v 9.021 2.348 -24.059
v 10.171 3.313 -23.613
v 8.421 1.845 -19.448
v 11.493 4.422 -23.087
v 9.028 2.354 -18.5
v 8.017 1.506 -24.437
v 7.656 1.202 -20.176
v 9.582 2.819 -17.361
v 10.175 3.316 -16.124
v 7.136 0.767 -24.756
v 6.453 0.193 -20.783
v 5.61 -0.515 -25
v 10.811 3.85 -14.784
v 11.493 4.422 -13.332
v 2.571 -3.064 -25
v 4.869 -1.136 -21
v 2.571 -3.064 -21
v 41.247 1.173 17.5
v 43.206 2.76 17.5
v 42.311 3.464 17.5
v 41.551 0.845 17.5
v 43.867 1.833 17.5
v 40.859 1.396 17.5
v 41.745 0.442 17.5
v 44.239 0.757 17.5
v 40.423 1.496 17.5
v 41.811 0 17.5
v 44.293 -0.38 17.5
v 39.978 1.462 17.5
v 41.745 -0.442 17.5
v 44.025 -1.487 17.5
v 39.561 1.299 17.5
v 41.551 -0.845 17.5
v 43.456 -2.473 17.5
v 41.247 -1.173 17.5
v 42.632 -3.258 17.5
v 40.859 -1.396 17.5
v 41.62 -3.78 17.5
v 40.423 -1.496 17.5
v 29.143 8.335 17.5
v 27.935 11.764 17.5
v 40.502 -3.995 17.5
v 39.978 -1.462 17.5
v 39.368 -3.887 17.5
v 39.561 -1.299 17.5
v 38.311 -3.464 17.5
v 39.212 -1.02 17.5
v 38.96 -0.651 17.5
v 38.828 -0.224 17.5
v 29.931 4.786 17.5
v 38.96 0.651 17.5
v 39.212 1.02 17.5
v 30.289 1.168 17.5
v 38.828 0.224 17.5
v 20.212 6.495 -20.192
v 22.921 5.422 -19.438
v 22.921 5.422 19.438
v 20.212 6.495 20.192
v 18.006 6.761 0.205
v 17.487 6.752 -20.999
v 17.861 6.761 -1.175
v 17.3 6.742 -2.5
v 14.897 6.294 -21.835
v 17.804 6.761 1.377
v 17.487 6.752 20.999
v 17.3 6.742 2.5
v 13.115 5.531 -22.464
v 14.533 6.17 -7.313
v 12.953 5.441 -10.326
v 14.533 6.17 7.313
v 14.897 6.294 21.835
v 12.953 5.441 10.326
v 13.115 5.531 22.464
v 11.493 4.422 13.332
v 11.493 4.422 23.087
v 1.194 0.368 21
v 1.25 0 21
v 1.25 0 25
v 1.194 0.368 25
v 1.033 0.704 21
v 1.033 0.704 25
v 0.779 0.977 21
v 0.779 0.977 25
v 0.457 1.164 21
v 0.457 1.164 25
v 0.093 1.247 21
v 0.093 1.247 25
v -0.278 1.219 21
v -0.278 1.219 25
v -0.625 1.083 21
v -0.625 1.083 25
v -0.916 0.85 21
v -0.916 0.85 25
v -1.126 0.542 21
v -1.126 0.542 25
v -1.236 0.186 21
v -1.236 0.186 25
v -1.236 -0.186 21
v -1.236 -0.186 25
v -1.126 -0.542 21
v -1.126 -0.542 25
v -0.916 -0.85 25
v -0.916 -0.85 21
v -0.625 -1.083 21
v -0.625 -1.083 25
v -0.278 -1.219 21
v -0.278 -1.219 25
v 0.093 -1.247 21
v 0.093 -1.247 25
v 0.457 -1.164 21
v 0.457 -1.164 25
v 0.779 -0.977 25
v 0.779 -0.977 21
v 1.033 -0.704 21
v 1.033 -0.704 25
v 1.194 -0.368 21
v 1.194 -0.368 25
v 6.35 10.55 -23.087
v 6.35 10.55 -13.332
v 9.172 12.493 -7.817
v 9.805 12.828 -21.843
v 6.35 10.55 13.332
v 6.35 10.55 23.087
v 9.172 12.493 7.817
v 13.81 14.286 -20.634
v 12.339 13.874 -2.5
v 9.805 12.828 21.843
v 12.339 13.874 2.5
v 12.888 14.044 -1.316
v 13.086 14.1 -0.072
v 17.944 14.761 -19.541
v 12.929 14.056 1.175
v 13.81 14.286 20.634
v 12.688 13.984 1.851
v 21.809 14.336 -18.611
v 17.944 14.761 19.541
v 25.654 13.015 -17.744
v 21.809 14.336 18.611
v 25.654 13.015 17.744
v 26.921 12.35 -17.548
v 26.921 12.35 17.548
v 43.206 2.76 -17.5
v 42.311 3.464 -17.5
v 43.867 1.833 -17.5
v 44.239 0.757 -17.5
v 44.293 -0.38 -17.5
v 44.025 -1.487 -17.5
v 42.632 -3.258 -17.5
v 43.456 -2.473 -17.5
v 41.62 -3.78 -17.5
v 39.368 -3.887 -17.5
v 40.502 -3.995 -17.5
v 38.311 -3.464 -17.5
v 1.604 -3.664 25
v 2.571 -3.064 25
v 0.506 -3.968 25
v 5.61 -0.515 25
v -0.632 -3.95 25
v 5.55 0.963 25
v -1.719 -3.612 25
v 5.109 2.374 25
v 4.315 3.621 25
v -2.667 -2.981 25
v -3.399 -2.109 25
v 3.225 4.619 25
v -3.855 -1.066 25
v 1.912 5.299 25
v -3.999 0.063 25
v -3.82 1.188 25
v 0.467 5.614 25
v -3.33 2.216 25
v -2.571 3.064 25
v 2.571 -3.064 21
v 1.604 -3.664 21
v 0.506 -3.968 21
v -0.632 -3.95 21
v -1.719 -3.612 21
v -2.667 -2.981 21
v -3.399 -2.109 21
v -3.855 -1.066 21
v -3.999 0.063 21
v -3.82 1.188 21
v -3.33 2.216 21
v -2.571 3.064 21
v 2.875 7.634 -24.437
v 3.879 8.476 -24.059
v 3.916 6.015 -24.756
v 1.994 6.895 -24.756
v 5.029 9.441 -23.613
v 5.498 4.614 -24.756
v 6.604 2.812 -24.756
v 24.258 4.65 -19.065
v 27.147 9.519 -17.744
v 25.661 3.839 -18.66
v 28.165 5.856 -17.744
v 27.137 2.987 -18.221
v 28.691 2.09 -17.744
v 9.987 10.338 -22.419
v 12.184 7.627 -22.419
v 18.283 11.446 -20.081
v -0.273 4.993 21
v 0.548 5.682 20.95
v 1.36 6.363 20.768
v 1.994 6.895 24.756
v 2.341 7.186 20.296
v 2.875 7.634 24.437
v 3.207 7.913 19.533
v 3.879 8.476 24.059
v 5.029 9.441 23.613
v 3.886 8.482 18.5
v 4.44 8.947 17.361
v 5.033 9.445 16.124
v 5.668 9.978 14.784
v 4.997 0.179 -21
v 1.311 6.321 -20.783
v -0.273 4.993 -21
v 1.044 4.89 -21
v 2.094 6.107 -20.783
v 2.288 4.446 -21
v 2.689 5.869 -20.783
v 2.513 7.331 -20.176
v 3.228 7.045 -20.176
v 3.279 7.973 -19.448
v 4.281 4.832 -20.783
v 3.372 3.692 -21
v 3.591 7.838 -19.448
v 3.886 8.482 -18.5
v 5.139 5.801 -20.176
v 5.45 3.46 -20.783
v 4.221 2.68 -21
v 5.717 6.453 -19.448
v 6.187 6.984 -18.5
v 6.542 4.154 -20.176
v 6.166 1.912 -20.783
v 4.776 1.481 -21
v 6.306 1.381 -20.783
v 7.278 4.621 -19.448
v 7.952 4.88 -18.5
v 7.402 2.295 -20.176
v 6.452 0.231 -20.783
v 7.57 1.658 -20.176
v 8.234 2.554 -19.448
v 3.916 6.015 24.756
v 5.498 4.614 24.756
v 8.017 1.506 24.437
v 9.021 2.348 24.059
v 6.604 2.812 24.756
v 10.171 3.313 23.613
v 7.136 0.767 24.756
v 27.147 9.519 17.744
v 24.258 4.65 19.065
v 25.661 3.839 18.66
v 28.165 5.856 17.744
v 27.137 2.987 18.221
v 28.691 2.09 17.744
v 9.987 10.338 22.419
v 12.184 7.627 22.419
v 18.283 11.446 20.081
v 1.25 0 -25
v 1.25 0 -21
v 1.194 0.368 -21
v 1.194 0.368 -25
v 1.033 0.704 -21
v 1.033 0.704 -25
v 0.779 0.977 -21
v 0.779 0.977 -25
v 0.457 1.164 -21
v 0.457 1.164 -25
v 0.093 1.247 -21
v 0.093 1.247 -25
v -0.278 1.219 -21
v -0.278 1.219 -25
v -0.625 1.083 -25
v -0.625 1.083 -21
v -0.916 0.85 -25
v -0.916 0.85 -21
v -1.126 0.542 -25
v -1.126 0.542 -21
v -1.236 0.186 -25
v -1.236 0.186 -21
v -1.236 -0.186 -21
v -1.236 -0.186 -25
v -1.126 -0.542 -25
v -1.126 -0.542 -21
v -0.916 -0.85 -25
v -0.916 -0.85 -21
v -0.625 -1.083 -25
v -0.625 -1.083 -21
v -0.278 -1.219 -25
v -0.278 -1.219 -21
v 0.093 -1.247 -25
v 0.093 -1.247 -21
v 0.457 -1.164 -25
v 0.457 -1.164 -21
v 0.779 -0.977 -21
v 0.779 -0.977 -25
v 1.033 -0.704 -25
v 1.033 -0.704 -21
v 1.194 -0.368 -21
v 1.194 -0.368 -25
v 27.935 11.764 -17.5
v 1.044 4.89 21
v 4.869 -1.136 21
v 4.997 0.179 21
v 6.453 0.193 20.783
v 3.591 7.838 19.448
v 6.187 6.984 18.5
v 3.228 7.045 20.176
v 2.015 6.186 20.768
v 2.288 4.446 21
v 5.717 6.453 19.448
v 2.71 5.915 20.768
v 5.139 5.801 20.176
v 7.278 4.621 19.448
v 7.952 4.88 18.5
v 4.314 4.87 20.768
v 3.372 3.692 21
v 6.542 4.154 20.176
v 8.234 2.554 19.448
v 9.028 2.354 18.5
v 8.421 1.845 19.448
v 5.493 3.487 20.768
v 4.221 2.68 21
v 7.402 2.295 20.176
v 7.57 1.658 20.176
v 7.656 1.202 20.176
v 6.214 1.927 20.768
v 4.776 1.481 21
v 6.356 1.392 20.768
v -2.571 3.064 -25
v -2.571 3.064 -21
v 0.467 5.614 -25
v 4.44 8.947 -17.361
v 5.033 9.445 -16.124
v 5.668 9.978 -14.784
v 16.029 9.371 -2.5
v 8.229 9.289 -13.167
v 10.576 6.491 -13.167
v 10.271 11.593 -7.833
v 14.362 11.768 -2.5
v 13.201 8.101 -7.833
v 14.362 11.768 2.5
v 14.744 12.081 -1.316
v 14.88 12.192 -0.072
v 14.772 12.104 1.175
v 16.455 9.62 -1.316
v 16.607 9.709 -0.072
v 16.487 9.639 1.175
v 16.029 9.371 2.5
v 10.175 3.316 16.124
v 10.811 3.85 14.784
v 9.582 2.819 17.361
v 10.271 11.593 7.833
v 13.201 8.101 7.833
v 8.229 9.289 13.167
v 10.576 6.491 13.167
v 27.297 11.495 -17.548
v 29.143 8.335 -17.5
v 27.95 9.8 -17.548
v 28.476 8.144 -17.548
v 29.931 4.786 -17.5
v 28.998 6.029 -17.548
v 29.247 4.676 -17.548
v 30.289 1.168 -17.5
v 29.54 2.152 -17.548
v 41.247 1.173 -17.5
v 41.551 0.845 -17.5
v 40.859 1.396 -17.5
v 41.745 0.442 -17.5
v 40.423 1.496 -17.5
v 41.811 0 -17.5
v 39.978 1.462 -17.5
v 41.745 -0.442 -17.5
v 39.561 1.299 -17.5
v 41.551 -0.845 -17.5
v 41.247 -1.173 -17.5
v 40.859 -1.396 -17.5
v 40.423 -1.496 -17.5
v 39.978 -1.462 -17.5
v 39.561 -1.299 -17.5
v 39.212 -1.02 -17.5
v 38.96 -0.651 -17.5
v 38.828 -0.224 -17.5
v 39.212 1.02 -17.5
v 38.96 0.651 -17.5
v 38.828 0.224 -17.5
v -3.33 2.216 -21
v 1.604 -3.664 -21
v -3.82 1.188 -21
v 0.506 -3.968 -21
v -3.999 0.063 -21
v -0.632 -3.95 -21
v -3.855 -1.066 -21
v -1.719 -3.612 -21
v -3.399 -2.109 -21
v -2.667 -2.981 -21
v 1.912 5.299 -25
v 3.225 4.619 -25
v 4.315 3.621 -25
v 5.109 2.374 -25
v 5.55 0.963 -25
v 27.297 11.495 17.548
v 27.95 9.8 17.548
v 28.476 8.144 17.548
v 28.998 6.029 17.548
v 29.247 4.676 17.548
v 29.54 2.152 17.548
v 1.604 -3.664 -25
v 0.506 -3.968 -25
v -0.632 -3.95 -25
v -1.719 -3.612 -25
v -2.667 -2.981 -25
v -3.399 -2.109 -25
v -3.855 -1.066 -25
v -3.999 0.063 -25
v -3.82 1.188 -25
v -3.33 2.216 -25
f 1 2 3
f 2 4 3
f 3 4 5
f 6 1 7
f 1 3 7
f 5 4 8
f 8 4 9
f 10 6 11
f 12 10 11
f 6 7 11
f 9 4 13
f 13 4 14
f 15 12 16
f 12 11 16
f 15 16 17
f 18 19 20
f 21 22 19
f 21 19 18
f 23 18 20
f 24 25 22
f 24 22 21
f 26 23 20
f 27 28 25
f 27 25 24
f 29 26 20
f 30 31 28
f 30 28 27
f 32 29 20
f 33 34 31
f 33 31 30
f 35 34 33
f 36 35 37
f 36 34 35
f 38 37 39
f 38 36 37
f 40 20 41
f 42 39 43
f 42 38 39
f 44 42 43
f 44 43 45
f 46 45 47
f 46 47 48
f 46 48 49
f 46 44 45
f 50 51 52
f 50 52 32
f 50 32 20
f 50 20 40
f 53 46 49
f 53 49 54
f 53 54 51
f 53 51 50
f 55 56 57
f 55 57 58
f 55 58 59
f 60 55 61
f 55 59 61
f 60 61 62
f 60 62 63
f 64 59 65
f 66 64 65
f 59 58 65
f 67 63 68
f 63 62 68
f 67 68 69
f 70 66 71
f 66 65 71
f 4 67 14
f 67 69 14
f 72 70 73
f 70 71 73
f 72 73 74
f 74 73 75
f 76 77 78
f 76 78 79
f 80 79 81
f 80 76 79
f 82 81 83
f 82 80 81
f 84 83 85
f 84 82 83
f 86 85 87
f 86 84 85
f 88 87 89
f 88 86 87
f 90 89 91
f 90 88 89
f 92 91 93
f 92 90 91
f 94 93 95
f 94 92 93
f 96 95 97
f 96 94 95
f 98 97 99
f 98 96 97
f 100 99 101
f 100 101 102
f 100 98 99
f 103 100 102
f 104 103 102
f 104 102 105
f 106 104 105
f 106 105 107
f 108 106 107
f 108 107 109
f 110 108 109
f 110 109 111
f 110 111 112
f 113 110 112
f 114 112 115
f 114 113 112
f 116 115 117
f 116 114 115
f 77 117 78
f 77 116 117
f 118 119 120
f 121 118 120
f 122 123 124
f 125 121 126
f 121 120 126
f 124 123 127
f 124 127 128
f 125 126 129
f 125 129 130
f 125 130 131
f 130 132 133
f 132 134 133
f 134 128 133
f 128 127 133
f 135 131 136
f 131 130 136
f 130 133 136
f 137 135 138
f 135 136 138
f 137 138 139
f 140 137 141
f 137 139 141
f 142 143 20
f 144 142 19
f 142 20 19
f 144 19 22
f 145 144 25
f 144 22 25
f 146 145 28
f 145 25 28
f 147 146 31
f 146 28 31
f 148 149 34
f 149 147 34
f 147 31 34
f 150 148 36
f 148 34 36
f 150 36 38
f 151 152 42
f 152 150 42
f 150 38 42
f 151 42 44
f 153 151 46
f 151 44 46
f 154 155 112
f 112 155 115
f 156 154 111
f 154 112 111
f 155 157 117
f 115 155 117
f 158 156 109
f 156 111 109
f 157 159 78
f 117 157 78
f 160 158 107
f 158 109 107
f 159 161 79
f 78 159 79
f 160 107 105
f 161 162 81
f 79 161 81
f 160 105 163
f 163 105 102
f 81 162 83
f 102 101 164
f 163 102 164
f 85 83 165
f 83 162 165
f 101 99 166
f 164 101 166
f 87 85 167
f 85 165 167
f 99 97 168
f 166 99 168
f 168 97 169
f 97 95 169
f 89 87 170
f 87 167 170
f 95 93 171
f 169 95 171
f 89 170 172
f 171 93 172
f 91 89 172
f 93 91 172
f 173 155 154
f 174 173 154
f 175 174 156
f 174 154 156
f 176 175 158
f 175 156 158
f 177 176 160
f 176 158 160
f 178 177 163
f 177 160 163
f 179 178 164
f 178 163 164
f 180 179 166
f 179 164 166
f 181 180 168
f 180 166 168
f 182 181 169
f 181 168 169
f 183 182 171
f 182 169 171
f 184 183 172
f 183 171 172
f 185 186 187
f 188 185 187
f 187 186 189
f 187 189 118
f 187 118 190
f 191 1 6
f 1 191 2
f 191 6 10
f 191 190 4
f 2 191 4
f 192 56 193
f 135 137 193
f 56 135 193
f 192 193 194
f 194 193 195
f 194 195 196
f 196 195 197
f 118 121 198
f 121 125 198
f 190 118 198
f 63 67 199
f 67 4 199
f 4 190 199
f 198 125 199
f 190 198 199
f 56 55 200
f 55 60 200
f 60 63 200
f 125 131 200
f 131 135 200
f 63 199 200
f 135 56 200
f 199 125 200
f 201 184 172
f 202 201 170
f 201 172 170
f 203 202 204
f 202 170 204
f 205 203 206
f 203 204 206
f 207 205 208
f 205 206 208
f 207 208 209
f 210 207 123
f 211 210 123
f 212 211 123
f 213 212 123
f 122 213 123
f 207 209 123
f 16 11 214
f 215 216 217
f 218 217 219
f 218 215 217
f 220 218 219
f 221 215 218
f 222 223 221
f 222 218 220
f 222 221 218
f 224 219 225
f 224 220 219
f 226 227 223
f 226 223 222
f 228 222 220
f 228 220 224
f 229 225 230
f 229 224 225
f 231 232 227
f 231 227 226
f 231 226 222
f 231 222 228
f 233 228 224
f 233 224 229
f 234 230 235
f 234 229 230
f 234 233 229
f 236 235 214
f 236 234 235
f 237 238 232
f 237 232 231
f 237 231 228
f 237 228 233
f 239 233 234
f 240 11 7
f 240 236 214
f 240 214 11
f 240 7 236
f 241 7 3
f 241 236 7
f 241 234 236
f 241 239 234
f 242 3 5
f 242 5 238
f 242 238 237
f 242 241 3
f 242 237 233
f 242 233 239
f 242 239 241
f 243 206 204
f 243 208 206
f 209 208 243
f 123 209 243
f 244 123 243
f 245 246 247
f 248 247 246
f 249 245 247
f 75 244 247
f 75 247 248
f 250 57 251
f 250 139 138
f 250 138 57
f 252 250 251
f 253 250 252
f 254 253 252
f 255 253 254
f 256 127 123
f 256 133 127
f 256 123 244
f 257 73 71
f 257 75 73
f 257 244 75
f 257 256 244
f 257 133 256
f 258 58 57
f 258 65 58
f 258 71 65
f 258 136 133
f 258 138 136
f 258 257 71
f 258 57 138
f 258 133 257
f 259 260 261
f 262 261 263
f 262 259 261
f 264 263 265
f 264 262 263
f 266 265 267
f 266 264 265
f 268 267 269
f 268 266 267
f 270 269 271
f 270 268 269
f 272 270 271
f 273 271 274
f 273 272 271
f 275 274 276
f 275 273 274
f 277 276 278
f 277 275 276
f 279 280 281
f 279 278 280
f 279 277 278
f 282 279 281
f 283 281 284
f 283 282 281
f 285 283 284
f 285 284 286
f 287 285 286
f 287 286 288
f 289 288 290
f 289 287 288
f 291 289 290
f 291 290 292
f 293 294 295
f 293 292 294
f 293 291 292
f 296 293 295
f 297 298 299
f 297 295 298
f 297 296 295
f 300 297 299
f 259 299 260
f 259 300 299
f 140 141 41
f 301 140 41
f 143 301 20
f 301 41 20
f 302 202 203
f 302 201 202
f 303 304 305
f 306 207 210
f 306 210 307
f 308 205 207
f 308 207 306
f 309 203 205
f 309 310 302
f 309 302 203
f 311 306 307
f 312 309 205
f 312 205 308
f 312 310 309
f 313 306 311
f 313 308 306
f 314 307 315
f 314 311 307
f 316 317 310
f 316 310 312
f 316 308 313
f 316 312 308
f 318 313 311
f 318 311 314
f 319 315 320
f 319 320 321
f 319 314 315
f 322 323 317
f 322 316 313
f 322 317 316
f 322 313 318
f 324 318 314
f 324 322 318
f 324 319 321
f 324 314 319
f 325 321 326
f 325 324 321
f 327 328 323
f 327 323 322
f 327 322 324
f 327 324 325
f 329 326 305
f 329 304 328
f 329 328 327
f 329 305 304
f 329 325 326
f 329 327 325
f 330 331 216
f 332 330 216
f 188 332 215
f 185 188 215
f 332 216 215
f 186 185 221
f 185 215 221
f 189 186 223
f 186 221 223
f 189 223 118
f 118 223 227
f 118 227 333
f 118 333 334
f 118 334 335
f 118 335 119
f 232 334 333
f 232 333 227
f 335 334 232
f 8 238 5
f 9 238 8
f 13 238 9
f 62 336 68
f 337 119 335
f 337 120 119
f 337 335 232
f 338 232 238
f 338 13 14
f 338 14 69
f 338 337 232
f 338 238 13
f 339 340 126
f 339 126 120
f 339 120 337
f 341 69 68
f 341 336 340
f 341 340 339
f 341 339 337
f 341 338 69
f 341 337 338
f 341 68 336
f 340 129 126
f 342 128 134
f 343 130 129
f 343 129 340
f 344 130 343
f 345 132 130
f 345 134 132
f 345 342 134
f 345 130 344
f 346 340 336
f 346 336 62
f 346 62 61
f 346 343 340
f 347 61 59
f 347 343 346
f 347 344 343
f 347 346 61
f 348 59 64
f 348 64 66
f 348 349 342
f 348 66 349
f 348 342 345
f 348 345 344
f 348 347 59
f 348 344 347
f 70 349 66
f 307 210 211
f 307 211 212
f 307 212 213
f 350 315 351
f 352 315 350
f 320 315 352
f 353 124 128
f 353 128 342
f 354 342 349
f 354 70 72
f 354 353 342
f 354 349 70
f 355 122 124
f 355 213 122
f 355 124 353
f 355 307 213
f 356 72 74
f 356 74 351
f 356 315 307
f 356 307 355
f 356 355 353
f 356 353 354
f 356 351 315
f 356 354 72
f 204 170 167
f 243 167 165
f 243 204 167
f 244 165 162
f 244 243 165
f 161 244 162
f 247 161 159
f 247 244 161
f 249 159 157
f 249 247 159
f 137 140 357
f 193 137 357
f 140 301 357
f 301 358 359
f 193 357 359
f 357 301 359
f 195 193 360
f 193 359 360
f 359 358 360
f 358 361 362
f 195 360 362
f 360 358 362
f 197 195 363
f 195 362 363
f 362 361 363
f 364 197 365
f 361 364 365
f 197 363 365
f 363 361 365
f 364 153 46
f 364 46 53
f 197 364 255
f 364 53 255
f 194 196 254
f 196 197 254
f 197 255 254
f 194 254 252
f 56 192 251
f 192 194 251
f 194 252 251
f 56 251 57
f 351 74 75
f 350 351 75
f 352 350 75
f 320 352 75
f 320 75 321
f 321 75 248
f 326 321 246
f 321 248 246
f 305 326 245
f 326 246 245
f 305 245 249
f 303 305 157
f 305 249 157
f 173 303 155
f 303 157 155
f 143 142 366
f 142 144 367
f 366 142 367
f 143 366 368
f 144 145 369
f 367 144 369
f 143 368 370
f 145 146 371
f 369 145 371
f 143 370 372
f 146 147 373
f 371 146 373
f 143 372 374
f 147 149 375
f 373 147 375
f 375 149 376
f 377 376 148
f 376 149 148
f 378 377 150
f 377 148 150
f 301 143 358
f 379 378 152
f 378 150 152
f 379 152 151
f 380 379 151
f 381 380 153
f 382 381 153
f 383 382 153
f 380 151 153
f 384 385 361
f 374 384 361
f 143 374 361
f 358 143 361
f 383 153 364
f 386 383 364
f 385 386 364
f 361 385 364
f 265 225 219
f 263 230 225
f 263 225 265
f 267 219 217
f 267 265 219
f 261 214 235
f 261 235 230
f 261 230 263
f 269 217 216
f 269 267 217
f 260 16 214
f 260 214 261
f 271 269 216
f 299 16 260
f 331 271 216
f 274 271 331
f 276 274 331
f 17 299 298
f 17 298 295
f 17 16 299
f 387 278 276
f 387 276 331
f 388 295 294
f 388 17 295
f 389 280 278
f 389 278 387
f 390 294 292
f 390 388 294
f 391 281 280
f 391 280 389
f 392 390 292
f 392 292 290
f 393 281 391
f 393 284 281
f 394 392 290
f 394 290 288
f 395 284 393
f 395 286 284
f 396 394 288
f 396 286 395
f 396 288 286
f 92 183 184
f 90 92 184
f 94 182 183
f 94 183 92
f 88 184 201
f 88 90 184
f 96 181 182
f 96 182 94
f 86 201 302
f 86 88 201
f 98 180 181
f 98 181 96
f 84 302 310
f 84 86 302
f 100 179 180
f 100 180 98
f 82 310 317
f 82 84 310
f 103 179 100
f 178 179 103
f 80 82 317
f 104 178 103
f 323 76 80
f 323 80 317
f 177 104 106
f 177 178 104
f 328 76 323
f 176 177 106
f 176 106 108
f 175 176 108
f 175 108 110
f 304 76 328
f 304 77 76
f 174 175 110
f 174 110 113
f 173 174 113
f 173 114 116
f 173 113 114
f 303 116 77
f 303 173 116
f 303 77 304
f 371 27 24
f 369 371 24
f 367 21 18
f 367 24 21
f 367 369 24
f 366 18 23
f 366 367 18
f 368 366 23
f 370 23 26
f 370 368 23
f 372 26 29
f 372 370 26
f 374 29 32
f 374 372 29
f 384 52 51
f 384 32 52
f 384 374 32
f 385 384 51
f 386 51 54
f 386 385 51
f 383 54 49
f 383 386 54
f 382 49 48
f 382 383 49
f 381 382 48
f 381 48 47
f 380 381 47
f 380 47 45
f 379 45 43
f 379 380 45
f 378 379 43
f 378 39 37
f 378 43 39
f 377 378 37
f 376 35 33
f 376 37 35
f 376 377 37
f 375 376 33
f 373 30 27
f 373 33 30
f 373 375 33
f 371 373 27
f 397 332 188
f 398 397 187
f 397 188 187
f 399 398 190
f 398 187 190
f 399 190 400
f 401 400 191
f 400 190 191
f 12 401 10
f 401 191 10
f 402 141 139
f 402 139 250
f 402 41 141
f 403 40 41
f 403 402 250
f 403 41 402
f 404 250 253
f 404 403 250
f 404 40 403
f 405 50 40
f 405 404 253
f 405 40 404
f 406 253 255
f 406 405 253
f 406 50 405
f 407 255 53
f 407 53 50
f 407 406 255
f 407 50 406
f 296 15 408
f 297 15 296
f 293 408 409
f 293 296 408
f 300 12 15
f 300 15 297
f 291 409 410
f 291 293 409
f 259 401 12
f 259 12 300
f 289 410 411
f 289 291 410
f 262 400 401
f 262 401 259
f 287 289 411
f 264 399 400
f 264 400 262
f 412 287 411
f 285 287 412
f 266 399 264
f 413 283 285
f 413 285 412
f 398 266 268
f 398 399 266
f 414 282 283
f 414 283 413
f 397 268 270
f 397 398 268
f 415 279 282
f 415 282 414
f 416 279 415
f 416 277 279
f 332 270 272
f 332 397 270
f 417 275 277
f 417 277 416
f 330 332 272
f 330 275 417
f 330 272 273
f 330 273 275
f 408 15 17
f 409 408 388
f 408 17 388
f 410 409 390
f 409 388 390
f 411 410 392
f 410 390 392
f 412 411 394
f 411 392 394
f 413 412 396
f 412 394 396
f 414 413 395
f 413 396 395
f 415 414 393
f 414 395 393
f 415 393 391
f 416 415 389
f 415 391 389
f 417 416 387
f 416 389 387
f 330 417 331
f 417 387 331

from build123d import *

# Parameters (mm, degrees)
ESQUISSE1_R        = 1.25
ESQUISSE1_R_2      = 1.5
BOSS_EXTRU_1_DEPTH = 25


with BuildPart() as part:
    # Esquisse1 → Boss.-Extru.1 (new, symmetric)
    with BuildSketch(Plane.XY):
        with BuildLine():
            Line((-2.571150439, 3.064177772), (6.350420085, 10.550264309))
            ThreePointArc((6.350420085, 10.550264309), (16.35179369, 14.692968898), (26.92059706, 12.349921601))
            Line((26.92059706, 12.349921601), (42.311288741, 3.464101615))
            ThreePointArc((42.311288741, 3.464101615), (43.775390357, -2), (38.311288741, -3.464101615))
            Line((38.311288741, -3.464101615), (22.92059706, 5.42171837))
            ThreePointArc((22.92059706, 5.42171837), (17.049039632, 6.723411313), (11.492720963, 4.421908764))
            Line((11.492720963, 4.421908764), (2.571150439, -3.064177772))
            ThreePointArc((2.571150439, -3.064177772), (-3.064177772, -2.571150439), (-2.571150439, 3.064177772))
        make_face()
        Circle(ESQUISSE1_R, mode=Mode.SUBTRACT)
        with Locations((40.311288741, 0)):
            Circle(ESQUISSE1_R_2, mode=Mode.SUBTRACT)
    extrude(amount=BOSS_EXTRU_1_DEPTH, both=True)

    # Esquisse4 → Enlèvement de matière-Révolution1 (revolve, cut)
    with BuildSketch(Plane(origin=(0, 0, 0), x_dir=(1, 0, 0), z_dir=(0, 1, 0))):
        with BuildLine():
            Line((80, 17.5), (80, 25))
            Line((80, 25), (5.633213888, 25))
            ThreePointArc((5.633213888, 25), (6.414996134, 24.93850347), (7.177547622, 24.755526608))
            Line((7.177547622, 24.755526608), (28.766955008, 17.744473392))
            ThreePointArc((28.766955008, 17.744473392), (29.529506495, 17.56149653), (30.311288741, 17.5))
            Line((30.311288741, 17.5), (80, 17.5))
        make_face()
        with BuildLine():
            Line((0, 21), (5, 21))
            ThreePointArc((5, 21), (7.5, 20.330127019), (9.330127019, 18.5))
            Line((9.330127019, 18.5), (18.567731326, 2.5))
            ThreePointArc((18.567731326, 2.5), (19.237604307, 0), (18.567731326, -2.5))
            Line((18.567731326, -2.5), (9.330127019, -18.5))
            ThreePointArc((9.330127019, -18.5), (7.5, -20.330127019), (5, -21))
            Line((5, -21), (0, -21))
            Line((0, -21), (0, 21))
        make_face()
        with BuildLine():
            Line((30.311288741, -17.5), (80, -17.5))
            Line((80, -17.5), (80, -25))
            Line((80, -25), (5.633213888, -25))
            ThreePointArc((5.633213888, -25), (6.414996134, -24.93850347), (7.177547622, -24.755526608))
            Line((7.177547622, -24.755526608), (28.766955008, -17.744473392))
            ThreePointArc((28.766955008, -17.744473392), (29.529506495, -17.56149653), (30.311288741, -17.5))
        make_face()
    revolve(axis=Axis((0, 0, 25), (0, 0, -1)), mode=Mode.SUBTRACT)


solid = part.part
